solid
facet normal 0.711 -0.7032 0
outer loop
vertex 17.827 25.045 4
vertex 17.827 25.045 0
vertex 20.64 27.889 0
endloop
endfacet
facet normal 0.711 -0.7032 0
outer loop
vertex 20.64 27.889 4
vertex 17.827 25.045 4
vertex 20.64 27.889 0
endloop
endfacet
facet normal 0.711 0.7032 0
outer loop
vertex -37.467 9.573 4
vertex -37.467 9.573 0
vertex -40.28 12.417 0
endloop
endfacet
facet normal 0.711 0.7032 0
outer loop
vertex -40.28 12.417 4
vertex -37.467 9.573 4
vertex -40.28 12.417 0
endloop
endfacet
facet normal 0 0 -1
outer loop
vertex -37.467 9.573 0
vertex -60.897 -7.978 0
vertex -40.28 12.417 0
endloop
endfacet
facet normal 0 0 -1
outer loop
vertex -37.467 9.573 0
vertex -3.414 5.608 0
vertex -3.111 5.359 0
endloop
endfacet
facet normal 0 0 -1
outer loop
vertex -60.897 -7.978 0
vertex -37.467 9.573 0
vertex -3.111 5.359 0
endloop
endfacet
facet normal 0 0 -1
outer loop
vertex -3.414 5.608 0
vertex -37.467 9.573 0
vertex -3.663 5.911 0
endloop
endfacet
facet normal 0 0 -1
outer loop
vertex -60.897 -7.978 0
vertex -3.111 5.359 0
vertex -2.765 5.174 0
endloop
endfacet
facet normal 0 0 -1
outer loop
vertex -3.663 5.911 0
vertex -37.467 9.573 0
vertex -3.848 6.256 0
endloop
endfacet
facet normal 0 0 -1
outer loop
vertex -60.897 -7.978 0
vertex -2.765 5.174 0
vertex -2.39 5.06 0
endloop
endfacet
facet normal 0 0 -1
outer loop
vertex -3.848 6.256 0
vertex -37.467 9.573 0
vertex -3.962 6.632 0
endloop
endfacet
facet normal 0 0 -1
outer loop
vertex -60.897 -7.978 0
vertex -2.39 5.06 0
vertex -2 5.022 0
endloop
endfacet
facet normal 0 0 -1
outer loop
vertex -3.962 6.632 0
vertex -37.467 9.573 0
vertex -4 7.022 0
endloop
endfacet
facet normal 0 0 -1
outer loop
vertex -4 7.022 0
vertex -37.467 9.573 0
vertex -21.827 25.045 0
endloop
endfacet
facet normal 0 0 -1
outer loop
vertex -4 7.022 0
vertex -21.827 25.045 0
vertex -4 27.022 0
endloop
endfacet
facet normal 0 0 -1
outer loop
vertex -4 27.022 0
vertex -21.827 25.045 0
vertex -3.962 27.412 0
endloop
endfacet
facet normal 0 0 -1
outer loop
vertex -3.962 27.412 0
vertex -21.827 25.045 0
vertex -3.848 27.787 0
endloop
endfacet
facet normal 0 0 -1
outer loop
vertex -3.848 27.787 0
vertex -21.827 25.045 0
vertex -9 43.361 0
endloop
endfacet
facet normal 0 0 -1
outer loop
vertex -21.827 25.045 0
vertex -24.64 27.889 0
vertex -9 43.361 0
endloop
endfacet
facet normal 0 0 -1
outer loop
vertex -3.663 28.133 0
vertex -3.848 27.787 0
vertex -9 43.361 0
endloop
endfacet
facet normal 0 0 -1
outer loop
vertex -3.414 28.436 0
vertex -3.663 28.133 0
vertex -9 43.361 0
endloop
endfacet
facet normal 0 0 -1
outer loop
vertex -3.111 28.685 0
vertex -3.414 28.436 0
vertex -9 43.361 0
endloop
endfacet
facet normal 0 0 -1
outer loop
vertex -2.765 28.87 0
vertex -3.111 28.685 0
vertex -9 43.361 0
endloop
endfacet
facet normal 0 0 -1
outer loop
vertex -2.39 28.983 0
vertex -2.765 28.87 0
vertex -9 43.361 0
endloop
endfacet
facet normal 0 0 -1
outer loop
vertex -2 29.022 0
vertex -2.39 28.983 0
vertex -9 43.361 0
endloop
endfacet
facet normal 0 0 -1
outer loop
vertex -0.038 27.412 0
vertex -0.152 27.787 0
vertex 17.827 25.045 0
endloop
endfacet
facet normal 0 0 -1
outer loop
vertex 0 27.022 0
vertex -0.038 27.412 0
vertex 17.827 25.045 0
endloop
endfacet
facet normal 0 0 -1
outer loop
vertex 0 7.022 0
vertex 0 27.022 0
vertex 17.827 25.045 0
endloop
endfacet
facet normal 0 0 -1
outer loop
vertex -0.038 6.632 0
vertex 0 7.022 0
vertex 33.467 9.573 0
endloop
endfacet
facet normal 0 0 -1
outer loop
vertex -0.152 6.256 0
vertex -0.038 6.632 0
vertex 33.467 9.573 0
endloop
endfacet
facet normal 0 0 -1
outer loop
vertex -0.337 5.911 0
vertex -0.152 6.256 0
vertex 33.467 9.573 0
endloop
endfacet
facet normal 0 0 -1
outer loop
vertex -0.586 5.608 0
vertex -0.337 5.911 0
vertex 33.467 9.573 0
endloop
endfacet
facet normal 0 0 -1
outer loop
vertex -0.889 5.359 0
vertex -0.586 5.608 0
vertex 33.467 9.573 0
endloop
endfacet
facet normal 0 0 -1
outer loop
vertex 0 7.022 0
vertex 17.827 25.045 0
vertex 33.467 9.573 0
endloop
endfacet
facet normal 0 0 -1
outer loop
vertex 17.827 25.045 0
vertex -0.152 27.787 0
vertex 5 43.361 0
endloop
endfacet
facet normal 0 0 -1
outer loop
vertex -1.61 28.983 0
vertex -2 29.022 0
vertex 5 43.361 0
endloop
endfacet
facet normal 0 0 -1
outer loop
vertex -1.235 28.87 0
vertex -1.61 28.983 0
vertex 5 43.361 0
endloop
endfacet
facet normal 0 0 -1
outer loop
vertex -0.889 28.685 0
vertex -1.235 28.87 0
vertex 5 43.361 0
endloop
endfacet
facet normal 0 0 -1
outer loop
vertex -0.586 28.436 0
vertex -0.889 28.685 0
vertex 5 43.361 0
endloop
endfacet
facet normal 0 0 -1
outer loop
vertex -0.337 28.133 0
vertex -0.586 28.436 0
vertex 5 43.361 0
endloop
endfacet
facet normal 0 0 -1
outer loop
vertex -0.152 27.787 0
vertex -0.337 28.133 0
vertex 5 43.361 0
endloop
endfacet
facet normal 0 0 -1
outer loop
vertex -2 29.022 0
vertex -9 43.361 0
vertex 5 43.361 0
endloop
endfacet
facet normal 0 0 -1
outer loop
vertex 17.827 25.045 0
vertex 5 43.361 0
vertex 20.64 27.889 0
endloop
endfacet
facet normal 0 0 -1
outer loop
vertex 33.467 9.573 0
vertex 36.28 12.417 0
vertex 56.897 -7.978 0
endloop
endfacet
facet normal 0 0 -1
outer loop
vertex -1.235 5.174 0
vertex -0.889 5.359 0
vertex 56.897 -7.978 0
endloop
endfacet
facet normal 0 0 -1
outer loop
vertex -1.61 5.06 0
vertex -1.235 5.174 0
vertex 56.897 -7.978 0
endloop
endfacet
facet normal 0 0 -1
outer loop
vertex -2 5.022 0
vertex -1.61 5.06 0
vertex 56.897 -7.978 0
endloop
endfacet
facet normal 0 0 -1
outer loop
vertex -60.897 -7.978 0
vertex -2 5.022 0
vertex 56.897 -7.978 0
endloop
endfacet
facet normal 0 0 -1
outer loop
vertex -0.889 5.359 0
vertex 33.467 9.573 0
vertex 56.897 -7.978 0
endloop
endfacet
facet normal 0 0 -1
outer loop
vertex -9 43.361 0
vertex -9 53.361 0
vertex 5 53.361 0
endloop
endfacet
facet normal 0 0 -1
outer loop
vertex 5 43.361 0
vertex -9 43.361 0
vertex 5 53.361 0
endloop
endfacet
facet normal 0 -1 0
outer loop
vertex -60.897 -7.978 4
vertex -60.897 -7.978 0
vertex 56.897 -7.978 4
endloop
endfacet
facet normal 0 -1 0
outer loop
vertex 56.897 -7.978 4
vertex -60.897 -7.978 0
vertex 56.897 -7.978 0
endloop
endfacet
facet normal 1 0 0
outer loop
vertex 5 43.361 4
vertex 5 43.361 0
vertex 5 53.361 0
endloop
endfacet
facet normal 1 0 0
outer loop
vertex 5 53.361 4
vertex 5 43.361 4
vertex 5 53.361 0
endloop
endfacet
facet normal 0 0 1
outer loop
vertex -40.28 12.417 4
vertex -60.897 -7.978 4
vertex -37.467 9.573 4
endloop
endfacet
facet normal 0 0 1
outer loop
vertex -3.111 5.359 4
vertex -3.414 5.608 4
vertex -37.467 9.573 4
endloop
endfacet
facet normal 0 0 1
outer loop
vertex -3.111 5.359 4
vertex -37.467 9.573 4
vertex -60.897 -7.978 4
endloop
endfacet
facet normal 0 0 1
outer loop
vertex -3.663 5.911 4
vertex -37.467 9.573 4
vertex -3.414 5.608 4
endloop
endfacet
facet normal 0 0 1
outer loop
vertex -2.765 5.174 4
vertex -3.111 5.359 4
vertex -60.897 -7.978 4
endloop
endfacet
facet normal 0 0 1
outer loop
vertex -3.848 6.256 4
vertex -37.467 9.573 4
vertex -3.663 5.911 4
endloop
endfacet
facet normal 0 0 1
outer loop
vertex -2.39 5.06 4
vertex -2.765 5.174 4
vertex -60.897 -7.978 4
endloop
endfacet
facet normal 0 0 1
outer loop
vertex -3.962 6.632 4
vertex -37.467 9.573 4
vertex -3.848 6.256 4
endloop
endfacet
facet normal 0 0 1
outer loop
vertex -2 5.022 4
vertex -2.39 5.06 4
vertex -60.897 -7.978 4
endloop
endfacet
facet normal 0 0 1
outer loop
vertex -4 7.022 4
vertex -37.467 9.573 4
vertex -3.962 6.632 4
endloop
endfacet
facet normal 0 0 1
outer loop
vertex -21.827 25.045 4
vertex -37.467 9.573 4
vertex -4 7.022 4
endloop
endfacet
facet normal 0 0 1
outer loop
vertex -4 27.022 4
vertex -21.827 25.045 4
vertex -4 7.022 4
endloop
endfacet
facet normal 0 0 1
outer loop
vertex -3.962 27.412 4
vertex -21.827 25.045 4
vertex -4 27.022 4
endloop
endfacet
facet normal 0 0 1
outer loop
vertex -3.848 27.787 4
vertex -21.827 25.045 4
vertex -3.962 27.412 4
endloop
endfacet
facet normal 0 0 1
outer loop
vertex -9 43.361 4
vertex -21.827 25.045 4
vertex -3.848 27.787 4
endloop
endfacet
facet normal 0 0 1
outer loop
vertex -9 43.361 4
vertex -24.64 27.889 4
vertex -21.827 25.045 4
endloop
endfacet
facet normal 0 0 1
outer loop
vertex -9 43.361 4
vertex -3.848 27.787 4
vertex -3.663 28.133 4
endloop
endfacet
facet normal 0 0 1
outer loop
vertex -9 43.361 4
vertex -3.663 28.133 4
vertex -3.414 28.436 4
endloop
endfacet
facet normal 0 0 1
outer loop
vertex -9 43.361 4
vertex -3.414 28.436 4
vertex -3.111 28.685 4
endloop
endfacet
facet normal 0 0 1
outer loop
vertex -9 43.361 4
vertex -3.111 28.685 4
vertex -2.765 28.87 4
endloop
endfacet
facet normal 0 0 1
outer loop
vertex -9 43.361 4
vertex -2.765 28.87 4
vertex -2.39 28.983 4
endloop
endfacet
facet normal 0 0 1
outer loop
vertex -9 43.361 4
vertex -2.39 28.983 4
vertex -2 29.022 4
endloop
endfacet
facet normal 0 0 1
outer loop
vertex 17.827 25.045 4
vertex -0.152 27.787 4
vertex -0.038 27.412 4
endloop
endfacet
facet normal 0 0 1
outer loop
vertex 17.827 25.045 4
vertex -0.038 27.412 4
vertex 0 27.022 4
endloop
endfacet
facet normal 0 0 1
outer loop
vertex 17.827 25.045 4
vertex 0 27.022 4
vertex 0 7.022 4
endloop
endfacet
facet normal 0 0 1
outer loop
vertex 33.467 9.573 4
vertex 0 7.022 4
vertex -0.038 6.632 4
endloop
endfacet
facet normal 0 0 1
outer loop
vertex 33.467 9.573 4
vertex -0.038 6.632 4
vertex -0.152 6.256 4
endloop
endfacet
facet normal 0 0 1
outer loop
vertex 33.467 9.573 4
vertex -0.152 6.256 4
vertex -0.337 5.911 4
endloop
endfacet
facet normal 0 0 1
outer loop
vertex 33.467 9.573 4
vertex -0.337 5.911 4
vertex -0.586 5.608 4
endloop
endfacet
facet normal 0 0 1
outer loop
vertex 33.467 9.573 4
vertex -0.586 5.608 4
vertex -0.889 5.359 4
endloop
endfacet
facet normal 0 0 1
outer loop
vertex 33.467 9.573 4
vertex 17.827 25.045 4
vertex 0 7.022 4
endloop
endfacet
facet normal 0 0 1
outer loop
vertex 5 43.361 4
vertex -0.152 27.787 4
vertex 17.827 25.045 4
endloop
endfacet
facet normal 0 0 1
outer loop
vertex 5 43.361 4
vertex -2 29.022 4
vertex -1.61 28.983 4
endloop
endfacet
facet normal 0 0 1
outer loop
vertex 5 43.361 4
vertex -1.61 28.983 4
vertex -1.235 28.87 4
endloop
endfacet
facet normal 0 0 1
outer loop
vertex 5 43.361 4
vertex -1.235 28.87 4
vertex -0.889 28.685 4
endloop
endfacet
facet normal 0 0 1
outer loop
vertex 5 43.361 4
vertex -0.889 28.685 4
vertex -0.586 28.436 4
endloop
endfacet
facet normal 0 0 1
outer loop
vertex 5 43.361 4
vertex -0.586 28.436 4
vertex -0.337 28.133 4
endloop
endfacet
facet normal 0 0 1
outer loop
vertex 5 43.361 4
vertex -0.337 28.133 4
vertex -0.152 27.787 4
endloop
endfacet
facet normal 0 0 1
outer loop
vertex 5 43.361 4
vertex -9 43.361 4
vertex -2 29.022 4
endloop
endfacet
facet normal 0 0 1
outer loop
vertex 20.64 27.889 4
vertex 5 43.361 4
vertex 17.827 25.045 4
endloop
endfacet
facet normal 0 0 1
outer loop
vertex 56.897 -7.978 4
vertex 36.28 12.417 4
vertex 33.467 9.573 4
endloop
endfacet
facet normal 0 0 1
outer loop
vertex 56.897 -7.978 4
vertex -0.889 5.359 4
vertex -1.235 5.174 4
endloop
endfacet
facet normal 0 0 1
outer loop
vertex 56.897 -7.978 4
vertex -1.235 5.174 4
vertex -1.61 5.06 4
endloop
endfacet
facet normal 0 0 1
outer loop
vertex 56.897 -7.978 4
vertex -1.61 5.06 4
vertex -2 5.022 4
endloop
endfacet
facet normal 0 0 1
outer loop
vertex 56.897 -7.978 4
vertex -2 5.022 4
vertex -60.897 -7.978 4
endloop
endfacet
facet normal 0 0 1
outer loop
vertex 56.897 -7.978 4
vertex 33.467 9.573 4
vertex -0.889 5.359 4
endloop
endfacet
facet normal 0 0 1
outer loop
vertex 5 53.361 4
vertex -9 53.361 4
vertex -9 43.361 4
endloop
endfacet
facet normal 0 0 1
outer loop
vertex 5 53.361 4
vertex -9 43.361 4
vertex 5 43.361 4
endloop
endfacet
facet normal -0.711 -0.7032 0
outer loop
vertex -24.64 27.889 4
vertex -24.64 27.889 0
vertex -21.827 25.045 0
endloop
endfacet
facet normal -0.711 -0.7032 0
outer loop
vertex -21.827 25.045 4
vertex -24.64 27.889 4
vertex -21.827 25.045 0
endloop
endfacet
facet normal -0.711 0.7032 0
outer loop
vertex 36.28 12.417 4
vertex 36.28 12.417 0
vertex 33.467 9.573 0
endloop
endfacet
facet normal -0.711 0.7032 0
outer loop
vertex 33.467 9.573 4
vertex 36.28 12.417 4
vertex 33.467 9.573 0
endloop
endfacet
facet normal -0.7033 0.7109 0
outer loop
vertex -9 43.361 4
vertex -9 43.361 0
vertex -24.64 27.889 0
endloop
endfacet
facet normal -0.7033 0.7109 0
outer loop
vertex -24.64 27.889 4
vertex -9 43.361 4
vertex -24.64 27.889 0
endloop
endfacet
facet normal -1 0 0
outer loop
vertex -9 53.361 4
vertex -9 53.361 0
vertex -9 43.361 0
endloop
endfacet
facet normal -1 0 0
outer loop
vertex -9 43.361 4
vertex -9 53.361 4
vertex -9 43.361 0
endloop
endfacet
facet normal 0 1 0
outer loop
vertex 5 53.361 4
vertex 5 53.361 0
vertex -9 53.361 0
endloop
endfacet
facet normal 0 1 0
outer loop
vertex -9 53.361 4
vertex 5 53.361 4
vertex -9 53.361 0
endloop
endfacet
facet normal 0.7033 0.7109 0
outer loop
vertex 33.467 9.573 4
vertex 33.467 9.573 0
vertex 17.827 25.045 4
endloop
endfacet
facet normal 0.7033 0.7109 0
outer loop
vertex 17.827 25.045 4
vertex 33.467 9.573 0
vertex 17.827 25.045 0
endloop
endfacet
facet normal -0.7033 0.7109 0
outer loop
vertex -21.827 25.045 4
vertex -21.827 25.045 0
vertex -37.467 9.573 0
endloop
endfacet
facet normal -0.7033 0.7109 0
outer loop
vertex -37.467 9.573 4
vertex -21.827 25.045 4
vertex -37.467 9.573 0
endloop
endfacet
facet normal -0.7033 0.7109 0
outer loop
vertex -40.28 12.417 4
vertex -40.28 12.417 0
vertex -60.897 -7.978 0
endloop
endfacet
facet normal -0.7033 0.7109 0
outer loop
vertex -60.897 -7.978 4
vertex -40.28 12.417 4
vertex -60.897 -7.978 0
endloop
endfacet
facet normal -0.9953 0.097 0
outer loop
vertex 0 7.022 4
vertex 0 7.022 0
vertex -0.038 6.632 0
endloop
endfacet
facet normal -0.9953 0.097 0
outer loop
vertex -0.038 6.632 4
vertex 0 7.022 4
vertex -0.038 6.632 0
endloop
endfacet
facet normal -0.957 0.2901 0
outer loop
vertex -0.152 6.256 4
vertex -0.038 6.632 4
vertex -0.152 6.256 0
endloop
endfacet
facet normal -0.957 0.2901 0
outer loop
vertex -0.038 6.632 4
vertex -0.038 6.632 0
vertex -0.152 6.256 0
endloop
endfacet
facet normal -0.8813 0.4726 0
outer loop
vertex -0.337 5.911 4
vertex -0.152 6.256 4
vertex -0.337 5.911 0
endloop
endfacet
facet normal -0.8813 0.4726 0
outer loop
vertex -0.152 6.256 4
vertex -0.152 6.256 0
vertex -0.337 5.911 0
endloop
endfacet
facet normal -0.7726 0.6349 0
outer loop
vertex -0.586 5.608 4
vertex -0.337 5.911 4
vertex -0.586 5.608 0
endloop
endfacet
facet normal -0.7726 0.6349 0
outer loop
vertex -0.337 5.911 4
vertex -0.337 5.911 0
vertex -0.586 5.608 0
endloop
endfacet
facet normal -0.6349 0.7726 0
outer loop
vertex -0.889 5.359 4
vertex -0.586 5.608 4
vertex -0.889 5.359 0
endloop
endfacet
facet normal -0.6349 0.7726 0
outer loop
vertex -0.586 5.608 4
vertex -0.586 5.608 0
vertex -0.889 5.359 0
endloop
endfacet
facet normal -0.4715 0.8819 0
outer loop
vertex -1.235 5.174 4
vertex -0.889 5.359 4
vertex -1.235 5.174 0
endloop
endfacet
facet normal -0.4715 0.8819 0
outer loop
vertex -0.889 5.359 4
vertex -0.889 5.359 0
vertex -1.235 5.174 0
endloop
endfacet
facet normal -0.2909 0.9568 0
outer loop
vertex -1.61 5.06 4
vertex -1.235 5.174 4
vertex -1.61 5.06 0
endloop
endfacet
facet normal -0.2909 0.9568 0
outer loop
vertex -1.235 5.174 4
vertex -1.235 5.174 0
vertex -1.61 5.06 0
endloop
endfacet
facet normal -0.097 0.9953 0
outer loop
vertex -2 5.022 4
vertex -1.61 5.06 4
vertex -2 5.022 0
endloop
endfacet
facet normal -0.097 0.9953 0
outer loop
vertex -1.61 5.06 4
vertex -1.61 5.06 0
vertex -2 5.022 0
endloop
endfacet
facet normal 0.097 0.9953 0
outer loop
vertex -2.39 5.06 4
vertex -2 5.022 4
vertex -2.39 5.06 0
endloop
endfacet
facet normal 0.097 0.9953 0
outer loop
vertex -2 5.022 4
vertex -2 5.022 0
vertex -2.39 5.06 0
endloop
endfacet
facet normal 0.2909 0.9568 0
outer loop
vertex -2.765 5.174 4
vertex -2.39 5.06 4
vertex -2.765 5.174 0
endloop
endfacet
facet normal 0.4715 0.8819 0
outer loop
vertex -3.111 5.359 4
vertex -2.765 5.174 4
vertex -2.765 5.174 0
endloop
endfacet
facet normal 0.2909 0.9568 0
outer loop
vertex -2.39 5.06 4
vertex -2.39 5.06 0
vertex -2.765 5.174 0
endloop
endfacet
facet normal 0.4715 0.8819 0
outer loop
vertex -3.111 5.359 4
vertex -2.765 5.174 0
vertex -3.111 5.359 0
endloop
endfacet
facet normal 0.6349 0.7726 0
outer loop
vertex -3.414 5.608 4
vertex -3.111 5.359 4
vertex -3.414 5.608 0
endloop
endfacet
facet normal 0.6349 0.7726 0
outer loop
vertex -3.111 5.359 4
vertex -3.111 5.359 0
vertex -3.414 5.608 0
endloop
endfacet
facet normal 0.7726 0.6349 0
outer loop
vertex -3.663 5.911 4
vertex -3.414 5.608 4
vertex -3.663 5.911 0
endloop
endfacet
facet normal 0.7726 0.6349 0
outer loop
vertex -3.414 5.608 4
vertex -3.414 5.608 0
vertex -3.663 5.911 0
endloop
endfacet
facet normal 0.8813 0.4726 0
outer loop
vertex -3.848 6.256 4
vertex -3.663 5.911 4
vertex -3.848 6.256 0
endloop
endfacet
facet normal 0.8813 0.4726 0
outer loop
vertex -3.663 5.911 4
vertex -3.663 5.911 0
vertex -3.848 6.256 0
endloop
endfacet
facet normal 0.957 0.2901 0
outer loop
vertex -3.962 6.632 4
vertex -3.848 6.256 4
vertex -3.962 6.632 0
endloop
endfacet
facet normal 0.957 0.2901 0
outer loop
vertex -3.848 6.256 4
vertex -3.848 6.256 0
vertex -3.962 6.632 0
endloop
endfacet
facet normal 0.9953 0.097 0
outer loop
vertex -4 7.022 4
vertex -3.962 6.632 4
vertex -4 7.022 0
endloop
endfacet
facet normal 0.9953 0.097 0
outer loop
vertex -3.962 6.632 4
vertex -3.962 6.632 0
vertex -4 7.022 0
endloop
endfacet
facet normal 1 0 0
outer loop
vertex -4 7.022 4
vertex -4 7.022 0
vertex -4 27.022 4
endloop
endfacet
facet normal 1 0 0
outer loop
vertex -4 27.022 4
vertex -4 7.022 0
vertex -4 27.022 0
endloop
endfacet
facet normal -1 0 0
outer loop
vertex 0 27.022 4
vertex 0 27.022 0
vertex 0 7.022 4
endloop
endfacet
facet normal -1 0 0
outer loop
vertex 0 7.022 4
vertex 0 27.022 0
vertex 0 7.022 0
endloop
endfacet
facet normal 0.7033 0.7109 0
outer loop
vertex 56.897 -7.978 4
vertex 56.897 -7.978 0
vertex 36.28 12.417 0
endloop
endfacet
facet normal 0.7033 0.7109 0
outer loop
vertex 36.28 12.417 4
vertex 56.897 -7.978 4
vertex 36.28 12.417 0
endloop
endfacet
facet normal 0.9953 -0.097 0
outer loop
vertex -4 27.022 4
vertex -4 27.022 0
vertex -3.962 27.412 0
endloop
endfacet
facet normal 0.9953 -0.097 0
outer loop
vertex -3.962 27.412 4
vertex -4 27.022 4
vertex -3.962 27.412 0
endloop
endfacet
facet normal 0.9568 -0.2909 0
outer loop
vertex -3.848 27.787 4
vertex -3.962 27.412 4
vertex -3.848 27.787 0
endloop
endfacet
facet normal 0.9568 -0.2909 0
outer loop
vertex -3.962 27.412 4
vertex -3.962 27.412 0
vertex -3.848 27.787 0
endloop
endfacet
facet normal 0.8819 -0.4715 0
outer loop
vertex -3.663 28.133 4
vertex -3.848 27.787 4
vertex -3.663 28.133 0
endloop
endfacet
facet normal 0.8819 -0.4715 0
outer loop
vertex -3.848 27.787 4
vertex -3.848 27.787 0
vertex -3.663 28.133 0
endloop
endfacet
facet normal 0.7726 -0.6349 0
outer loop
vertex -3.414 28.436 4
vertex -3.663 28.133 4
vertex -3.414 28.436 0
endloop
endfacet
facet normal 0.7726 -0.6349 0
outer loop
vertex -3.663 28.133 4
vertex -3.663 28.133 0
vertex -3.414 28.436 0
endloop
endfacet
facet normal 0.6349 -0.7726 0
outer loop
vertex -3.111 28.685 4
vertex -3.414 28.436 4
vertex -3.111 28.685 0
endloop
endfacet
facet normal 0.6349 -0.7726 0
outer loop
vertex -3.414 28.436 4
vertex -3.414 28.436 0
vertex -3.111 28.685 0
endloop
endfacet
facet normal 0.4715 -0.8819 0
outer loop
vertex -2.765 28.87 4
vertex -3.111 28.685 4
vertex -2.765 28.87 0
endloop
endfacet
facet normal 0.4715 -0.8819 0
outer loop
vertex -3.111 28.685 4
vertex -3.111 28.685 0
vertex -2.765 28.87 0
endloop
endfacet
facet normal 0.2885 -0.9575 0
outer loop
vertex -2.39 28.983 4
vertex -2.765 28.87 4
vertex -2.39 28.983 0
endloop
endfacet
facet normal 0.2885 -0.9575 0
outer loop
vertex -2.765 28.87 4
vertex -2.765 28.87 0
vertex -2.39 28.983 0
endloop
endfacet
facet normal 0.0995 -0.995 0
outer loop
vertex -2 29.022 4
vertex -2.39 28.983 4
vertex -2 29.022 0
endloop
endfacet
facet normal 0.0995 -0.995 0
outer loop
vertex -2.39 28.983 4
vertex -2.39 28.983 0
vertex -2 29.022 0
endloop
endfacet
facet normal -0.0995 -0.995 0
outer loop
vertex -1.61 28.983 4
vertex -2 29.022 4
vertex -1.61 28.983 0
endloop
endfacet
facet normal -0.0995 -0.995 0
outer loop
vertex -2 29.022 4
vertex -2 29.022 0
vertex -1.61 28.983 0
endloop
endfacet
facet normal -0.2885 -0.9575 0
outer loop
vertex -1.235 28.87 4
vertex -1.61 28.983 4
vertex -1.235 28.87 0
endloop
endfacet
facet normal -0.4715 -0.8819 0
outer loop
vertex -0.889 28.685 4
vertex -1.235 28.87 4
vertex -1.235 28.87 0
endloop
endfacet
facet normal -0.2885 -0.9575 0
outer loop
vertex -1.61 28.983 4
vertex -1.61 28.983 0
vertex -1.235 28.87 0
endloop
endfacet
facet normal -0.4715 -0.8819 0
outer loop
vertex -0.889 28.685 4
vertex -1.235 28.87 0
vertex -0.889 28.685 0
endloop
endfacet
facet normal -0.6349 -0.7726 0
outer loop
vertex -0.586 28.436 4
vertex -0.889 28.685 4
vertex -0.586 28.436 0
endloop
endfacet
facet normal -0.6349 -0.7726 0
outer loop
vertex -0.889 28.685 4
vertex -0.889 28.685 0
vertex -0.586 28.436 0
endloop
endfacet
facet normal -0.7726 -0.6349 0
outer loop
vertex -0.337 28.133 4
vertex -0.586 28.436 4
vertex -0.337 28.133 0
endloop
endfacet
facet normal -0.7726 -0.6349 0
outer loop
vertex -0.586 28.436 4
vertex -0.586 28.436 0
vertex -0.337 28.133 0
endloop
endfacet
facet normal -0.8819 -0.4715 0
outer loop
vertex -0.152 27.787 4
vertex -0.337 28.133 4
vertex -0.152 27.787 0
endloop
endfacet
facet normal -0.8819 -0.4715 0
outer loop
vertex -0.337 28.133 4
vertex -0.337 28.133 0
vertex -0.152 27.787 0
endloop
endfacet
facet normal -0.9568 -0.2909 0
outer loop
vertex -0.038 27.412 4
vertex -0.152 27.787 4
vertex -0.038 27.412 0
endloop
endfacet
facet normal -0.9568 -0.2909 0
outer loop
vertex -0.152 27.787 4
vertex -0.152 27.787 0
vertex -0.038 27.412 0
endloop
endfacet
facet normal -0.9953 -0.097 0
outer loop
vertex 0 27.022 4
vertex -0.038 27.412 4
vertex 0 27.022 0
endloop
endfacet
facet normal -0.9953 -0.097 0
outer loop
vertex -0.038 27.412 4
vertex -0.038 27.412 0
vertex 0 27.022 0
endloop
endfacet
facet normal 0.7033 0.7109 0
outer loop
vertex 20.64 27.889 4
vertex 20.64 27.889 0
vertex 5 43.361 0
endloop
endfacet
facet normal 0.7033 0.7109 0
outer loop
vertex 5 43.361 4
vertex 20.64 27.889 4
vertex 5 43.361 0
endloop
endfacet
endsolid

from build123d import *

# Parameters (mm, degrees)
F1_DEPTH = 4


with BuildPart() as f1:
    # F0 (on Top) → F1 (new body)
    with BuildSketch(Plane.XY):
        Polygon((-24.640209, 27.888809), (-21.827112, 25.045134), (-37.467321, 9.5731), (-40.280418, 12.416774), (-60.897057, -7.978181), (56.897057, -7.978181), (36.280418, 12.416774), (33.467321, 9.5731), (17.827112, 25.045134), (20.640209, 27.888809), (5, 43.360843), (5, 53.360843), (-9, 53.360843), (-9, 43.360843), align=None)
        with BuildLine():
            Line((0, 27.021819), (0, 7.021819))
            ThreePointArc((0, 7.021819), (-2, 5.021819), (-4, 7.021819))
            Line((-4, 7.021819), (-4, 27.021819))
            ThreePointArc((-4, 27.021819), (-2, 29.021819), (0, 27.021819))
        make_face(mode=Mode.SUBTRACT)
    extrude(amount=F1_DEPTH)


solid = f1.part
